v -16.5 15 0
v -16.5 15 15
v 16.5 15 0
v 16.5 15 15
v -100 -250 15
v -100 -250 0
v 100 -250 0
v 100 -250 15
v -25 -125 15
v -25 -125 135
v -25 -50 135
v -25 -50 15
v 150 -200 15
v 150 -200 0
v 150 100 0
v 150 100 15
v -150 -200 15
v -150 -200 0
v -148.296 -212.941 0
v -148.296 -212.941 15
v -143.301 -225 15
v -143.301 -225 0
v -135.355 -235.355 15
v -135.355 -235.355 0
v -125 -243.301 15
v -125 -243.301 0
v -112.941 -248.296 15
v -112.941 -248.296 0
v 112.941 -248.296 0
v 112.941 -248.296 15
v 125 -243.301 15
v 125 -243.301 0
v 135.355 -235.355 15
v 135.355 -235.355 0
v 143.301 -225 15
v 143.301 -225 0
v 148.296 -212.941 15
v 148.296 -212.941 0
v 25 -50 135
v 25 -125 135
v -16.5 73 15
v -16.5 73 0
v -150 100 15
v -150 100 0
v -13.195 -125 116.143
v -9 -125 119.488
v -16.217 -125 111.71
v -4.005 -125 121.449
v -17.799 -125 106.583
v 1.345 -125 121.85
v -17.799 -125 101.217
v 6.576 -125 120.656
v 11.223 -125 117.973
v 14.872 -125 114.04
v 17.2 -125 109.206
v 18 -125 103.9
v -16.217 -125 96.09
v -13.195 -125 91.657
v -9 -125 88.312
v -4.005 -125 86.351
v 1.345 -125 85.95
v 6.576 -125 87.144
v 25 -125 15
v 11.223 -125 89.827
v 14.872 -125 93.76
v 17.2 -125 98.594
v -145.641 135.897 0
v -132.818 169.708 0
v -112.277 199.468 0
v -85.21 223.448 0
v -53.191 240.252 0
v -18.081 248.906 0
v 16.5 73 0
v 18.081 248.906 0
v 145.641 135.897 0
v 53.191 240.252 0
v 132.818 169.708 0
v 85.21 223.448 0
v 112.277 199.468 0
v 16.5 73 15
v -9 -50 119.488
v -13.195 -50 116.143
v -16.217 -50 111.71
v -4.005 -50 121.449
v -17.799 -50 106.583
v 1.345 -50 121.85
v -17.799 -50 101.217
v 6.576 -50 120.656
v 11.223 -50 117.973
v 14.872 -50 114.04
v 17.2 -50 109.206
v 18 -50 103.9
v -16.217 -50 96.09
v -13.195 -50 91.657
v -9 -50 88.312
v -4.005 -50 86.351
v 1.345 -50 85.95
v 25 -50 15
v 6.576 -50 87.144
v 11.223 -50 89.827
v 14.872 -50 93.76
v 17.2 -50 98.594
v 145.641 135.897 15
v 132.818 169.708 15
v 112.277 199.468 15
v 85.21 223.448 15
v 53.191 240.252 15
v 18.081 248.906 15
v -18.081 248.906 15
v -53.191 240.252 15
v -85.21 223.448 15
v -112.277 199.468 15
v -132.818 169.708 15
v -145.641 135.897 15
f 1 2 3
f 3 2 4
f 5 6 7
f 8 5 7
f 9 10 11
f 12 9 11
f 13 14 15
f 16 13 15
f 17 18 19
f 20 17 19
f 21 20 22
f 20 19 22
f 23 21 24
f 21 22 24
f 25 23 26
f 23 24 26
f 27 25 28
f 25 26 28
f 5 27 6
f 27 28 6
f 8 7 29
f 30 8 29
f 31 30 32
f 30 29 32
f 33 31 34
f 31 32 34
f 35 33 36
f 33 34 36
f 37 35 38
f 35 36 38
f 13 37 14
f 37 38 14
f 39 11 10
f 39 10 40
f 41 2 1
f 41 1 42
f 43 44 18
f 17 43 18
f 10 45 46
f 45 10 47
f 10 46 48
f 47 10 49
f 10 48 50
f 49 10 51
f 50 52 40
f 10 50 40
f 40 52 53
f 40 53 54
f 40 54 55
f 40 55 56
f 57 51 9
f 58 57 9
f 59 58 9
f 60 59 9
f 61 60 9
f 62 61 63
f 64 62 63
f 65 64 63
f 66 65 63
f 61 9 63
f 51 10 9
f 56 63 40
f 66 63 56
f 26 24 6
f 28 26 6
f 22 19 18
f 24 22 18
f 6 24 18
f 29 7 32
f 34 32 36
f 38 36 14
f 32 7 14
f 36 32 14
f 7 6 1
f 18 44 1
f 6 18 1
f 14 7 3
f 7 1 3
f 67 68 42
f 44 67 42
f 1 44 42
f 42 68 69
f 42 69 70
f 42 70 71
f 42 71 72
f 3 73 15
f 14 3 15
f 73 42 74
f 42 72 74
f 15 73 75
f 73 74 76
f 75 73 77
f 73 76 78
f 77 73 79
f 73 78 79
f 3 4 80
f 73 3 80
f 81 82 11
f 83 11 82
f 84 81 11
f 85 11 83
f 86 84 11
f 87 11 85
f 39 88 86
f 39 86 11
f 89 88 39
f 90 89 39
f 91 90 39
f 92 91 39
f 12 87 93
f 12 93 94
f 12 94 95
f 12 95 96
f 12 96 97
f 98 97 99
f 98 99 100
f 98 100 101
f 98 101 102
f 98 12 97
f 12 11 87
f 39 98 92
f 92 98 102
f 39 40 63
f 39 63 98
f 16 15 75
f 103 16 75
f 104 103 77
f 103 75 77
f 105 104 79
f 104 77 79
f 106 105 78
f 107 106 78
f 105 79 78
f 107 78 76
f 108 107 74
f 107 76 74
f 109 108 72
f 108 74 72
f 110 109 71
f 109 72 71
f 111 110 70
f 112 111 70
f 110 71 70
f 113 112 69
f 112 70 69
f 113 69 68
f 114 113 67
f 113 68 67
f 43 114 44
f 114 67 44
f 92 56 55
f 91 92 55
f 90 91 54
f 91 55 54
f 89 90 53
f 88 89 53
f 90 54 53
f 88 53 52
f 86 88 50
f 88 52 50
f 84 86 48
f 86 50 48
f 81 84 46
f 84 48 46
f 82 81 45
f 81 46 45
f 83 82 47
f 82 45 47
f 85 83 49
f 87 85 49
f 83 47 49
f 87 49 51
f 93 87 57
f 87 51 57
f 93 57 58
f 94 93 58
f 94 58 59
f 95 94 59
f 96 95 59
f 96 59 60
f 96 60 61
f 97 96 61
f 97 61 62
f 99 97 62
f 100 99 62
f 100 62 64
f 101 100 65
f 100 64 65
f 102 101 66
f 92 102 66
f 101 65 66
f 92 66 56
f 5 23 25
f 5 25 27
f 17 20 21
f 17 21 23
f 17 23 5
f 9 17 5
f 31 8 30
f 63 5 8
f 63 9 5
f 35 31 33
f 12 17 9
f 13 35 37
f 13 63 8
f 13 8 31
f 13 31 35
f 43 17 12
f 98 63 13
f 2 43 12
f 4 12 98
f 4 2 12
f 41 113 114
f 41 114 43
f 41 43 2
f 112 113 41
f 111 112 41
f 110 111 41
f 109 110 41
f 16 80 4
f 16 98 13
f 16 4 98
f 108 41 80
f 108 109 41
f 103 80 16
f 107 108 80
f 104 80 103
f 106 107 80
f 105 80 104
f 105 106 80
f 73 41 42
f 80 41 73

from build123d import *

# Parameters (mm, degrees)
F1_DEPTH = 15
F2_W     = 33
F2_H     = 58
F3_DEPTH = 15.001
F4_W     = 50
F4_H     = 75
F5_DEPTH = 120
F6_R     = 18
F7_DEPTH = 75


# Not quite as in the source:
# - a feature of the source that left no trace in its solid (it failed there, or was rolled back) is left out


with BuildPart() as f1:
    # F0 (on Top) → F1 (new body)
    with BuildSketch(Plane.XY):
        with BuildLine():
            Line((-100, -250), (100, -250))
            ThreePointArc((100, -250), (135.3553390593, -235.3553390593), (150, -200))
            Line((150, -200), (150, 100))
            ThreePointArc((150, 100), (0, 250), (-150, 100))
            Line((-150, 100), (-150, -200))
            ThreePointArc((-150, -200), (-135.3553390593, -235.3553390593), (-100, -250))
        make_face()
    extrude(amount=F1_DEPTH)

    # F2 (on face) → F3 (cut, through all)
    with BuildSketch(Plane.XY.offset(15)):
        with Locations((0, 44)):
            Rectangle(F2_W, F2_H)
    extrude(amount=-F3_DEPTH, mode=Mode.SUBTRACT)

    # F4 (on face) → F5 (join)
    with BuildSketch(Plane.XY.offset(15)):
        with Locations((0, -87.5)):
            Rectangle(F4_W, F4_H)
    extrude(amount=F5_DEPTH)

    # F6 (on face) → F7 (cut, through all)
    with BuildSketch(Plane.XZ.offset(125)):
        with Locations((0, 103.9)):
            Circle(F6_R)
    extrude(amount=-F7_DEPTH, mode=Mode.SUBTRACT)


solid = f1.part
